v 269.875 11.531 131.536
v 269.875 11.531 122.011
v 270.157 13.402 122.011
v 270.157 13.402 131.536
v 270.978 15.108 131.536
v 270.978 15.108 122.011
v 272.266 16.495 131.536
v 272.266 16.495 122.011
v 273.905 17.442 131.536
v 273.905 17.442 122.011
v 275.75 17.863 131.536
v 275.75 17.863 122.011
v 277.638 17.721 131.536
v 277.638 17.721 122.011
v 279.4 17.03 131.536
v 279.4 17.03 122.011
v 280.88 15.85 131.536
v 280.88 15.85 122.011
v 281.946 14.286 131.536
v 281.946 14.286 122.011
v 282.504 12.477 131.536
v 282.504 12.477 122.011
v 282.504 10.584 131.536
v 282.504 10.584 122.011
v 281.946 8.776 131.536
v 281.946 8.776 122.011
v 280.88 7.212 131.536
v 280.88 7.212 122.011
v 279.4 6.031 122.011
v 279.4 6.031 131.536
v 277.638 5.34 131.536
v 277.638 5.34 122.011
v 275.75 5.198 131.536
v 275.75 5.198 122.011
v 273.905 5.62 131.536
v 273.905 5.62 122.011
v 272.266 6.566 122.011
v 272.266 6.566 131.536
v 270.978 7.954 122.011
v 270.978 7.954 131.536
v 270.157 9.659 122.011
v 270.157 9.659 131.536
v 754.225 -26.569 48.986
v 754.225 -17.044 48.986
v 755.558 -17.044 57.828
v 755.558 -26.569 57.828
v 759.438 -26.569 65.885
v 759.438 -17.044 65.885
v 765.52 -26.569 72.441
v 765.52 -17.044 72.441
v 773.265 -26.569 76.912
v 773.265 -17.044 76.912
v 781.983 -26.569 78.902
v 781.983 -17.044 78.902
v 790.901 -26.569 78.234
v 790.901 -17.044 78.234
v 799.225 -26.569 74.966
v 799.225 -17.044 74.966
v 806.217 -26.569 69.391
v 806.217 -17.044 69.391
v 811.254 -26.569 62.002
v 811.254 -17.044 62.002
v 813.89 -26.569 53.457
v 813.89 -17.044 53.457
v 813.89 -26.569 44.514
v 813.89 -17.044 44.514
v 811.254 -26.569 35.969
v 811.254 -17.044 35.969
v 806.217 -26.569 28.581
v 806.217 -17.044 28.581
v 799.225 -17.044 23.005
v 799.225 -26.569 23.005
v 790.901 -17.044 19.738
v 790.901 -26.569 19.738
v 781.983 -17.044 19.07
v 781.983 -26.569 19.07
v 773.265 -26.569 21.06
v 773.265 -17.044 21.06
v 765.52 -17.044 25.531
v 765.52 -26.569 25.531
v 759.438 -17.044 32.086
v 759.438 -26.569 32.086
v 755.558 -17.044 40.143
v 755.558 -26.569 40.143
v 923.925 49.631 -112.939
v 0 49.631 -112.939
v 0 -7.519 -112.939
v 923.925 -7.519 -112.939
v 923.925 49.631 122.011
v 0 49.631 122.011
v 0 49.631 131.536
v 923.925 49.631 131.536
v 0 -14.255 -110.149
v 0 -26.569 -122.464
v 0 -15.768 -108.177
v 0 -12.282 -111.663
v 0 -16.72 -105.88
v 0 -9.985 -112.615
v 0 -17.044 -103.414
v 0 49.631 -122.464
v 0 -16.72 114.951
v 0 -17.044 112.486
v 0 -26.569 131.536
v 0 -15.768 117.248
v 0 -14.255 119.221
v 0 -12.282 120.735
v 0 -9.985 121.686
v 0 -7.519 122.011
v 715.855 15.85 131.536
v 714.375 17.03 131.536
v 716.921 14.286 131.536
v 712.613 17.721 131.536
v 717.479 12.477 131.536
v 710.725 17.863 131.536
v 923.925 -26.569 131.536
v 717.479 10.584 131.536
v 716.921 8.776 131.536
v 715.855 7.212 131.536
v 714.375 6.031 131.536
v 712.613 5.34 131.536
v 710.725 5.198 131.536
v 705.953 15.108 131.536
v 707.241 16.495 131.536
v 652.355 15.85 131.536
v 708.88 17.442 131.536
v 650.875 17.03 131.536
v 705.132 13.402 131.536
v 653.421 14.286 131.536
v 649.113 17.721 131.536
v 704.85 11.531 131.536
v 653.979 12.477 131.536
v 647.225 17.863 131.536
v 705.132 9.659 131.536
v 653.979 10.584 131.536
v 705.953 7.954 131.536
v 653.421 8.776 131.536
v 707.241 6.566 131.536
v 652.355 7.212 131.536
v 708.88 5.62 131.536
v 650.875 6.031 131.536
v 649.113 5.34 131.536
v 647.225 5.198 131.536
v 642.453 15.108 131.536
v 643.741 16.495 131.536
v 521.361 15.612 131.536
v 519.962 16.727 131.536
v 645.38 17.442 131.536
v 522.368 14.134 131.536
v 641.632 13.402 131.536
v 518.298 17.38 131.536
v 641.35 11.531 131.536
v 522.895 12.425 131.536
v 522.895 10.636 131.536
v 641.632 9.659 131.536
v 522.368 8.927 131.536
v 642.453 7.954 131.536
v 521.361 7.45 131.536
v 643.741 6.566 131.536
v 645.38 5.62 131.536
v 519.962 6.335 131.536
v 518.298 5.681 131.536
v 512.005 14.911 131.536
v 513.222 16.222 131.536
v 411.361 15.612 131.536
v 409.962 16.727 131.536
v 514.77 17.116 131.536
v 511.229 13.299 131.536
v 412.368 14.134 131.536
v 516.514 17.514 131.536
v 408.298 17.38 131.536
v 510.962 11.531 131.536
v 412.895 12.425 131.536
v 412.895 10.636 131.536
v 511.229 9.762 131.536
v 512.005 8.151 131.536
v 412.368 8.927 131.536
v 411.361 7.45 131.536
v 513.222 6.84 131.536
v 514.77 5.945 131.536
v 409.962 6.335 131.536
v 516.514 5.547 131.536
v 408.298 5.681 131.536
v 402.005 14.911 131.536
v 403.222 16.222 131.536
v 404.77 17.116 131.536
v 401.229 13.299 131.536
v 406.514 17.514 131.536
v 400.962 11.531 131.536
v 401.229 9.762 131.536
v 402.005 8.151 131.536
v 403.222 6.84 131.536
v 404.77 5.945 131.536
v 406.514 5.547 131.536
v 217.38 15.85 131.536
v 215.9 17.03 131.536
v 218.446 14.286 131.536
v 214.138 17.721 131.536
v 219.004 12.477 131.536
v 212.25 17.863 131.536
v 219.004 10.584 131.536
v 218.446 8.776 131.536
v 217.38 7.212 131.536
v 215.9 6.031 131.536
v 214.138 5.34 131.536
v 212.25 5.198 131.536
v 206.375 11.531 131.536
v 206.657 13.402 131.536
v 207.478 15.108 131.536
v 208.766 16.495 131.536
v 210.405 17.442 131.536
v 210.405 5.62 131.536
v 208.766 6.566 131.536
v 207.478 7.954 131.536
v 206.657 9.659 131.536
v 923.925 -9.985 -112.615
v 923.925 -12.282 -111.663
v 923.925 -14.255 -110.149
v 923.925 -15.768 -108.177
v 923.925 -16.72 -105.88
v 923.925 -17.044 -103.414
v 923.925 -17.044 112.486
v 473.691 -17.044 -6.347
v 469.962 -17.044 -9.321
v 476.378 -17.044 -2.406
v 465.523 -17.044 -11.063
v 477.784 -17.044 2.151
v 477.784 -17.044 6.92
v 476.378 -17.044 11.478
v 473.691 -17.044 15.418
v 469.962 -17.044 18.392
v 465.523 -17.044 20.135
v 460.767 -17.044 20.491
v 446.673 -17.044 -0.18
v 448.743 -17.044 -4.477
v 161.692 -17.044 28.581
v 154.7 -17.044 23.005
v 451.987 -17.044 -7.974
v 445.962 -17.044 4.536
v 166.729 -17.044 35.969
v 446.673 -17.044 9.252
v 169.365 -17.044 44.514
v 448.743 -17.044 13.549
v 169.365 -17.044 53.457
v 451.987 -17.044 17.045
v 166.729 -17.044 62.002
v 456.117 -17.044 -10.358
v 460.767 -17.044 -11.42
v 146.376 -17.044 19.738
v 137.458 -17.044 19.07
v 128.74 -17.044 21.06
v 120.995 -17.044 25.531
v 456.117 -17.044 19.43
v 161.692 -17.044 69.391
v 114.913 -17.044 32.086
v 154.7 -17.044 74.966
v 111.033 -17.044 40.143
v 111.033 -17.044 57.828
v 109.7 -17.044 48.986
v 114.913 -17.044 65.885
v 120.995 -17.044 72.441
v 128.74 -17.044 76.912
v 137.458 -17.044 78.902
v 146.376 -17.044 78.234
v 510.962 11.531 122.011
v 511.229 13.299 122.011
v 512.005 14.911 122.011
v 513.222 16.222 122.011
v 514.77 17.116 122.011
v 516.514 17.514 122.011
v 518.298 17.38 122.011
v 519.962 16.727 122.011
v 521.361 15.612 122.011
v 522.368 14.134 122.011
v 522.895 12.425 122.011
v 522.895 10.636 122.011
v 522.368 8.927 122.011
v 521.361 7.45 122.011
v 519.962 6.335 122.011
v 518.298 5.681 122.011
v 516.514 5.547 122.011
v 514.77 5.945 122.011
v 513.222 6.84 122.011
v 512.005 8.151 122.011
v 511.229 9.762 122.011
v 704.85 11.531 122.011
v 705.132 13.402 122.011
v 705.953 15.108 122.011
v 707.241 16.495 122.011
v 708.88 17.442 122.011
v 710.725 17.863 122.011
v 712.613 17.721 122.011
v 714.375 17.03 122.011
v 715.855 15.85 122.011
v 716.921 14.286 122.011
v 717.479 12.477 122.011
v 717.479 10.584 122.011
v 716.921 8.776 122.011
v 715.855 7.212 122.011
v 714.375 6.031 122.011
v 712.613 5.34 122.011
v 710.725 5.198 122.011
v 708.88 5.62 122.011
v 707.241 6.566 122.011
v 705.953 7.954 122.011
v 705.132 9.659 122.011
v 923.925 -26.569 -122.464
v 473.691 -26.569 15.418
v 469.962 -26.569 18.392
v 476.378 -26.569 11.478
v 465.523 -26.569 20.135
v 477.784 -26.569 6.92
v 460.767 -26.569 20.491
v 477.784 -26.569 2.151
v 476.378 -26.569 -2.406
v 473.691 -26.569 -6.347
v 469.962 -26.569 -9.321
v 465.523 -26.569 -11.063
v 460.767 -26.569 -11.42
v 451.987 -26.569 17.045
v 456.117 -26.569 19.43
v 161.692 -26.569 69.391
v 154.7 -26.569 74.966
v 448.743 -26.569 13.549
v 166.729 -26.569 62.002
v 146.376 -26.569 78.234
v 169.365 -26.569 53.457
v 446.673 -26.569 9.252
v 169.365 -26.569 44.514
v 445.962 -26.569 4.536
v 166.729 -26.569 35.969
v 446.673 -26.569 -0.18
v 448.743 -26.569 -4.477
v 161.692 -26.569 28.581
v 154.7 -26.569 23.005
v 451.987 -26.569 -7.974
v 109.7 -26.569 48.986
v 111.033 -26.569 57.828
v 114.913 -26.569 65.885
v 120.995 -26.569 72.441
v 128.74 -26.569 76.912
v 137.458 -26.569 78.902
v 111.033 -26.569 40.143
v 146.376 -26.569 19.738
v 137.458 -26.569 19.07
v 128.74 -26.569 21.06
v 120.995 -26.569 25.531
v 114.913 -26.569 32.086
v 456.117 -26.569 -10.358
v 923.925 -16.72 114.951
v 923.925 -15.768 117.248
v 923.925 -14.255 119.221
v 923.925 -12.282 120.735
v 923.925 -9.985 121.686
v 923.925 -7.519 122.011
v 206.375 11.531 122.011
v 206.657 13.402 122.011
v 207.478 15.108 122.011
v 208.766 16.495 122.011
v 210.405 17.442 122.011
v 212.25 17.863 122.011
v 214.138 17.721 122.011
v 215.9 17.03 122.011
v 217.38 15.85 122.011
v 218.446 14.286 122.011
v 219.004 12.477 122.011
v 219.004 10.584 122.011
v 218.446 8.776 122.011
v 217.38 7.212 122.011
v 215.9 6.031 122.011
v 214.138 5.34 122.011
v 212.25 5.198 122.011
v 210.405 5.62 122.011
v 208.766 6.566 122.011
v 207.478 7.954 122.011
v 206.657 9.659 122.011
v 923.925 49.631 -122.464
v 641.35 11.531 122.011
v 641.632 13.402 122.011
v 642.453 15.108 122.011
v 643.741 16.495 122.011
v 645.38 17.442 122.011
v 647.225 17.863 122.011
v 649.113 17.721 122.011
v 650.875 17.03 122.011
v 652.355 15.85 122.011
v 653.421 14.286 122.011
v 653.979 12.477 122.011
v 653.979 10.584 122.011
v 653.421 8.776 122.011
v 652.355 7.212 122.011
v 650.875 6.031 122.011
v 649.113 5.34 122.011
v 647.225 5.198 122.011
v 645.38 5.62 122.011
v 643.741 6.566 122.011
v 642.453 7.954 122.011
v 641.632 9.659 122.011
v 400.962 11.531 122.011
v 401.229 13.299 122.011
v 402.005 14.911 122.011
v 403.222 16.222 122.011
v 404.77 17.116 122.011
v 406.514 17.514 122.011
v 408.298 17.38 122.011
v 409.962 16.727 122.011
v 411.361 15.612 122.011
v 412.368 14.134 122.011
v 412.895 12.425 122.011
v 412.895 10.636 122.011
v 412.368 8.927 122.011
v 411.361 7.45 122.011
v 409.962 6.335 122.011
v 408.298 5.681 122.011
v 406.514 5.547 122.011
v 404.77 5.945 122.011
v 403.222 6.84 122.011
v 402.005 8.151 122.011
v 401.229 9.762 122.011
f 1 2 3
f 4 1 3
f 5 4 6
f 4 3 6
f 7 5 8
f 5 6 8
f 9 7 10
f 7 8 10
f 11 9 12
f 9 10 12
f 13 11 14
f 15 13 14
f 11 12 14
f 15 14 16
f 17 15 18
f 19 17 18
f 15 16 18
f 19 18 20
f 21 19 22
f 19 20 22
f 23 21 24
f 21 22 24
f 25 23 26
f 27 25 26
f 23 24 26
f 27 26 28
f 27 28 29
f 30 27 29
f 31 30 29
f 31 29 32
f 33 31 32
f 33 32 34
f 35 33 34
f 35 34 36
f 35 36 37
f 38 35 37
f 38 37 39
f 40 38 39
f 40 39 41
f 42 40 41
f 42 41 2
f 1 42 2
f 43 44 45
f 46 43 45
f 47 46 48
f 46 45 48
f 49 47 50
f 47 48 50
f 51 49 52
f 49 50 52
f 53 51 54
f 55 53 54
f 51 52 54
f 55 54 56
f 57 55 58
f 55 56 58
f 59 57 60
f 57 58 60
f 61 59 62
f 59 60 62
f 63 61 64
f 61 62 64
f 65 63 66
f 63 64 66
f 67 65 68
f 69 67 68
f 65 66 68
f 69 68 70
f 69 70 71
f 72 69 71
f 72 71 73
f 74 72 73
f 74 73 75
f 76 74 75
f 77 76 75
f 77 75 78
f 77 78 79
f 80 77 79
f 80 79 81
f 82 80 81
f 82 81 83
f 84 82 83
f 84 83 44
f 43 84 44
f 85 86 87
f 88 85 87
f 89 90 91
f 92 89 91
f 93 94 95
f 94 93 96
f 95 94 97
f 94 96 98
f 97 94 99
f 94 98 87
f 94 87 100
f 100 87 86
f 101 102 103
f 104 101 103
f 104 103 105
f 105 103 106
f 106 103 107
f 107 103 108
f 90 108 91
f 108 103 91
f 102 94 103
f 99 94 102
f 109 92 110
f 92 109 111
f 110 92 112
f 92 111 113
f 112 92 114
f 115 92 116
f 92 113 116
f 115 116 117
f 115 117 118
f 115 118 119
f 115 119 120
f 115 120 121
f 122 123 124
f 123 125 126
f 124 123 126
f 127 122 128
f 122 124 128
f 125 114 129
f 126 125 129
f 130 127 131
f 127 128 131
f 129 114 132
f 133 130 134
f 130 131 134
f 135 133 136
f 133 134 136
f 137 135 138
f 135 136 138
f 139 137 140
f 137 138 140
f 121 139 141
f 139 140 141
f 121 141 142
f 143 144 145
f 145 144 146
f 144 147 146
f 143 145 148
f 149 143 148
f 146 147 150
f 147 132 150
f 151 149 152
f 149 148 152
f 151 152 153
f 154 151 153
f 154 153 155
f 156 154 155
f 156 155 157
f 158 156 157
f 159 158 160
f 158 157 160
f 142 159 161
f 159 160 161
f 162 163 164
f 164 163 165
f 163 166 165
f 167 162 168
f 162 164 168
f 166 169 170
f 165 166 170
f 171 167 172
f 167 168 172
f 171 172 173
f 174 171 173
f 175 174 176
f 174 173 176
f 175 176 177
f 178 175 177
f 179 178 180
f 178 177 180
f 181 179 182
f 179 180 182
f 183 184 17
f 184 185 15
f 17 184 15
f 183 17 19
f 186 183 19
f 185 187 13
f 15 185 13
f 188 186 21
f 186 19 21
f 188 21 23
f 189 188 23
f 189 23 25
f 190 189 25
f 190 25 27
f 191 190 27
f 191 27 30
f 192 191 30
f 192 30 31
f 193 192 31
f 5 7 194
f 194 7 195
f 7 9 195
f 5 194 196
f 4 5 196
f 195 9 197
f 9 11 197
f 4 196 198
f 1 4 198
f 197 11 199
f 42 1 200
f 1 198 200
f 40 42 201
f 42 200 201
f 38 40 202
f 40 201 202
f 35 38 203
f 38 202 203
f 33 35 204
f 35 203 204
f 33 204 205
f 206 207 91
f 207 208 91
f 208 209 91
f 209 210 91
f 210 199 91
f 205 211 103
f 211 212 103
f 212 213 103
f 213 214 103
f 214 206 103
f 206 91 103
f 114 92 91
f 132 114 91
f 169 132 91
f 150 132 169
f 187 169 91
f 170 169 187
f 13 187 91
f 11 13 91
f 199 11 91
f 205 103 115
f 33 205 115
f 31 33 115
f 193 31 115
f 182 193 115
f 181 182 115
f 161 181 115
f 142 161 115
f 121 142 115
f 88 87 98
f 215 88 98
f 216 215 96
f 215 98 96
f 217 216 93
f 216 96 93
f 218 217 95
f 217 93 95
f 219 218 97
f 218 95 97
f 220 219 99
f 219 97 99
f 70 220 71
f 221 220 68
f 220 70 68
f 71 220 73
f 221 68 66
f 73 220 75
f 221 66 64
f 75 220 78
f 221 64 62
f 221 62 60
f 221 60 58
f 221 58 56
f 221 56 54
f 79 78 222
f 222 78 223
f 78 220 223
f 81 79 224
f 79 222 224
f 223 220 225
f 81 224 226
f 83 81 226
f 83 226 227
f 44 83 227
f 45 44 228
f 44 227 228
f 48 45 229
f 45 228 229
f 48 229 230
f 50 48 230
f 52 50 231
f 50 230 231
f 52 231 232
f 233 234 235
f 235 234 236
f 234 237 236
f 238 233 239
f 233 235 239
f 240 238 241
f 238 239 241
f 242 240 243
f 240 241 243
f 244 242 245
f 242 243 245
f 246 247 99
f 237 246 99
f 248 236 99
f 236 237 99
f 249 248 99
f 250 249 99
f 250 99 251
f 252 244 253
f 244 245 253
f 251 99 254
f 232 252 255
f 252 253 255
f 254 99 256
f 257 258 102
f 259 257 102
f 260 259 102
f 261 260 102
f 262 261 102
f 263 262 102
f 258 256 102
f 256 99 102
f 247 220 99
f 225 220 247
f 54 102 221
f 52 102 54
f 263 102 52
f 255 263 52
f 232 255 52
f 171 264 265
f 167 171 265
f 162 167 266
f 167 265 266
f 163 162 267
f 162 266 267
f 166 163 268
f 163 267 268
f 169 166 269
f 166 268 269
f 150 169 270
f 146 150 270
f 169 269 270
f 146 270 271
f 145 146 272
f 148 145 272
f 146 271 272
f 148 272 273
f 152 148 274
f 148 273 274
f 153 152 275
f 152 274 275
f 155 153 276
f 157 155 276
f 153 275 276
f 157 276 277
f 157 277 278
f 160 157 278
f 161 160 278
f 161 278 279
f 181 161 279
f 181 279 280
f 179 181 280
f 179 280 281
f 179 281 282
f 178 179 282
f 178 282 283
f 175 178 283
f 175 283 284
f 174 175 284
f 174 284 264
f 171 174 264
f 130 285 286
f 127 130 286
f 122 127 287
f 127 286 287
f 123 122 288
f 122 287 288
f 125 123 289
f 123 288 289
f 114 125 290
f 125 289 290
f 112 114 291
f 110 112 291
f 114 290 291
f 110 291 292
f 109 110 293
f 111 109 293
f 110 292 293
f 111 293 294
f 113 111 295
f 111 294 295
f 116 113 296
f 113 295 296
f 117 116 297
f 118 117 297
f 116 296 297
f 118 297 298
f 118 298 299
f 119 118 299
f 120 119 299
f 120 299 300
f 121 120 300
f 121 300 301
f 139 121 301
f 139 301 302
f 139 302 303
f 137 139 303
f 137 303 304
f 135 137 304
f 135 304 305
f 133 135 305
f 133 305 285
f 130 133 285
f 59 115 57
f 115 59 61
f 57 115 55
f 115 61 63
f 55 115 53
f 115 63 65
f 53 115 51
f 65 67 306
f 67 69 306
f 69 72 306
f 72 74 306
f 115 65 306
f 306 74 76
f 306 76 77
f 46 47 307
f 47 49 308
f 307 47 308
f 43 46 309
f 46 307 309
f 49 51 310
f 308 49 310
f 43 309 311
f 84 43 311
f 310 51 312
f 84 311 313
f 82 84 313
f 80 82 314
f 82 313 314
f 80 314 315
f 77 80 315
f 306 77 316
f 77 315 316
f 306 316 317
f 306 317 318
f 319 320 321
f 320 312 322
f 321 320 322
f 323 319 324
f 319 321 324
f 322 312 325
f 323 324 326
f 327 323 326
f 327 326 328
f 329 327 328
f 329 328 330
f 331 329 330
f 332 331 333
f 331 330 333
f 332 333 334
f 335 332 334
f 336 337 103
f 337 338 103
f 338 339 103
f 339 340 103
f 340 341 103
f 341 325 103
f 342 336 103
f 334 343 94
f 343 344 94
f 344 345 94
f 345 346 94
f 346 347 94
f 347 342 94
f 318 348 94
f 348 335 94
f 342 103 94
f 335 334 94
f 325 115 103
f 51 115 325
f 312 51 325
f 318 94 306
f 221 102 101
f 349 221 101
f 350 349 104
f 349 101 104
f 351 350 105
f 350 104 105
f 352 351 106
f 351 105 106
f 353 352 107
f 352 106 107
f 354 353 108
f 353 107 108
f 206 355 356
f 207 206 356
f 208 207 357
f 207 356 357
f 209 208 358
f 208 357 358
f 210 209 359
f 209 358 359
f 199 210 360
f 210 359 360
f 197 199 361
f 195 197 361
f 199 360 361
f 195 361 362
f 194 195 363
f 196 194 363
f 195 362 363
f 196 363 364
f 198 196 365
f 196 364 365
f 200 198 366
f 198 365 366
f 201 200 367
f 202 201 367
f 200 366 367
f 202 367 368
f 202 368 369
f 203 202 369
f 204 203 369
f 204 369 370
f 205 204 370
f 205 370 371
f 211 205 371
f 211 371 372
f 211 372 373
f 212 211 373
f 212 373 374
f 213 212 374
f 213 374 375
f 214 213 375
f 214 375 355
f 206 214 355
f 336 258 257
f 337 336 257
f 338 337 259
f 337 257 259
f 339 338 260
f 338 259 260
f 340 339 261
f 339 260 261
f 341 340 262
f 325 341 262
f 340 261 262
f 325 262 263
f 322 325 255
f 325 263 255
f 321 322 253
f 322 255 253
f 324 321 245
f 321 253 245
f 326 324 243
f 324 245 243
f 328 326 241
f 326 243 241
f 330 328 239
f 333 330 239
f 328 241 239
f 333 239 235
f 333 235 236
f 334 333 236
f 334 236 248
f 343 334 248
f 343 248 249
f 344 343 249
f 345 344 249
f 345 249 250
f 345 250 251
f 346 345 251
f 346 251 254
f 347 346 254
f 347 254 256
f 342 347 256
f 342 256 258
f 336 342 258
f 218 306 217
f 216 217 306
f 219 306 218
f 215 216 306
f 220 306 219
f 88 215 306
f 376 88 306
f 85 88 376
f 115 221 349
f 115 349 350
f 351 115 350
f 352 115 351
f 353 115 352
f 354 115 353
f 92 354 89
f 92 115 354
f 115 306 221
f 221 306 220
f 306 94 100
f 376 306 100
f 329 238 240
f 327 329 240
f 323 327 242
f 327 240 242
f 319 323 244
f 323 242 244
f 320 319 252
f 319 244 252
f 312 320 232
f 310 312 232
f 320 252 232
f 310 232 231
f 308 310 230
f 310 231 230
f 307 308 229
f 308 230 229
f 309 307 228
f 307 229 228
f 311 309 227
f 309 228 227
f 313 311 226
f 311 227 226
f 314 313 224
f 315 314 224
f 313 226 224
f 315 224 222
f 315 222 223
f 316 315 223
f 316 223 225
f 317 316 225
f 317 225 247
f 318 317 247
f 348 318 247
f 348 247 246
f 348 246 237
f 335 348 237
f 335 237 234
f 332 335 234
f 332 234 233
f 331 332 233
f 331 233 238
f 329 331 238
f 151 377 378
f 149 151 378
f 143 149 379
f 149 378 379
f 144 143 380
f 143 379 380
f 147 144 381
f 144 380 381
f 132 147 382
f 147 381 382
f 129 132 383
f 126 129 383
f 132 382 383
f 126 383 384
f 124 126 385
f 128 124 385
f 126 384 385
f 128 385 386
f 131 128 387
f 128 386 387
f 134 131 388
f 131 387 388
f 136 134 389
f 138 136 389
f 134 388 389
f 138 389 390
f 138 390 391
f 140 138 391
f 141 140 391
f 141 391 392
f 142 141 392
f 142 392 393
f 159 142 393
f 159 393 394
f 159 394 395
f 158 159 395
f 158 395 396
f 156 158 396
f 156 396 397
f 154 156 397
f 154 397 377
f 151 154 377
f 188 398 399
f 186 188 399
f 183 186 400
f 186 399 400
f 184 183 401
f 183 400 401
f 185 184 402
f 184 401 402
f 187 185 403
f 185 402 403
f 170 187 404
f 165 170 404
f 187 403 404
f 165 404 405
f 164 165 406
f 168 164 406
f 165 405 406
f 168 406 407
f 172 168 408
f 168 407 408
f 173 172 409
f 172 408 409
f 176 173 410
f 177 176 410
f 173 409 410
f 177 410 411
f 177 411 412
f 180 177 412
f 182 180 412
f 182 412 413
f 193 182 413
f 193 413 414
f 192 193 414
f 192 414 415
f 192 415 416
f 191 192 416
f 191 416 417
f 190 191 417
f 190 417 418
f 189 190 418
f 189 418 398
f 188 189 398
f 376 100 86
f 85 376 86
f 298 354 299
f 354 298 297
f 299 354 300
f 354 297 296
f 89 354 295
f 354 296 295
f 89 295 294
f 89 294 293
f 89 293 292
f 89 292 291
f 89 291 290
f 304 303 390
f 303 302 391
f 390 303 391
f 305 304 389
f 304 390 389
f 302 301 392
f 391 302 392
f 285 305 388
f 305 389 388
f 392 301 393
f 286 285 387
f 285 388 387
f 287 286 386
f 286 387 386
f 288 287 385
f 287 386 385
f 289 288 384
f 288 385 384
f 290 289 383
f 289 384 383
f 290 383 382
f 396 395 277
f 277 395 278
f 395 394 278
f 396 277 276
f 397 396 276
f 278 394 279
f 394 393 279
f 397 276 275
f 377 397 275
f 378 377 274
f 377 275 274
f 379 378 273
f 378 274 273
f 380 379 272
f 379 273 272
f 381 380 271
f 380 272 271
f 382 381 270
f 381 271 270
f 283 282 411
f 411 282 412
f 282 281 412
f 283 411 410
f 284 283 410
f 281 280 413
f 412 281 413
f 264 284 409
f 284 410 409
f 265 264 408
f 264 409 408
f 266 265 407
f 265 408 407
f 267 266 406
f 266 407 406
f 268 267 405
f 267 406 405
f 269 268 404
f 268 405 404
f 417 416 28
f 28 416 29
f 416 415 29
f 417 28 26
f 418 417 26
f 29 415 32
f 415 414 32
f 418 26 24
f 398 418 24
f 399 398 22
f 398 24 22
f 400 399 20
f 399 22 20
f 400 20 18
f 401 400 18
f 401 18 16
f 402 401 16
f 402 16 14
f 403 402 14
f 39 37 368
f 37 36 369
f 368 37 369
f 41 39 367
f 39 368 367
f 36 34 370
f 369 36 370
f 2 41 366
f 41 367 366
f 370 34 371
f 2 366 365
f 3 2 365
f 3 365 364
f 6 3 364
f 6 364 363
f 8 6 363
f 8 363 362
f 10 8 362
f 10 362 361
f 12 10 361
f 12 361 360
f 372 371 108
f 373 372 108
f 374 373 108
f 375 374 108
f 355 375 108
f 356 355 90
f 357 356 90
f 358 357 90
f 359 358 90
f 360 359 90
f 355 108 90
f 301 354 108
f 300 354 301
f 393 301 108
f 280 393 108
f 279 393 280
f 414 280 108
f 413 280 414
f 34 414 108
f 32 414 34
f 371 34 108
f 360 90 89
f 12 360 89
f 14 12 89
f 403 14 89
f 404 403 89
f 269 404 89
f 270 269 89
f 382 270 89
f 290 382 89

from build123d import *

# Parameters (mm, degrees)
F1_DEPTH = 923.925
F3_D     = 12.7
F3_DEPTH = 30
F5_D     = 60
F5_DEPTH = 30
F6_D     = 32
F6_DEPTH = 30
F7_D     = 12
F7_DEPTH = 30


with BuildPart() as f1:
    # F0 (on Right) → F1 (new body)
    with BuildSketch(Plane.YZ):
        with BuildLine():
            Line((-26.569311, 131.535714), (-26.569311, -122.464286))
            Line((-26.569311, -122.464286), (49.630689, -122.464286))
            Line((49.630689, -122.464286), (49.630689, -112.939286))
            Line((49.630689, -112.939286), (-7.519311, -112.939286))
            ThreePointArc((-7.519311, -112.939286), (-14.254503, -110.149478), (-17.044311, -103.414286))
            Line((-17.044311, -103.414286), (-17.044311, 112.485714))
            ThreePointArc((-17.044311, 112.485714), (-14.254503, 119.220906), (-7.519311, 122.010714))
            Line((-7.519311, 122.010714), (49.630689, 122.010714))
            Line((49.630689, 122.010714), (49.630689, 131.535714))
            Line((49.630689, 131.535714), (-26.569311, 131.535714))
        make_face()
    extrude(amount=F1_DEPTH)

    # F3
    with Locations(Plane.XY.offset(131.535714)):
        with Locations((212.725, 11.530689), (276.225, 11.530689), (647.7, 11.530689), (711.2, 11.530689)):
            Hole(F3_D / 2, depth=F3_DEPTH)

    # F5
    with Locations(Plane.XZ.offset(26.569311)):
        with Locations((139.7, 48.985714), (784.225, 48.985714)):
            Hole(F5_D / 2, depth=F5_DEPTH)

    # F6
    with Locations(Plane.XZ.offset(26.569311)):
        with Locations((461.9625, 4.535714)):
            Hole(F6_D / 2, depth=F6_DEPTH)

    # F7
    with Locations(Plane.XY.offset(131.535714)):
        with Locations((406.9625, 11.530689), (516.9625, 11.530689)):
            Hole(F7_D / 2, depth=F7_DEPTH)


solid = f1.part
